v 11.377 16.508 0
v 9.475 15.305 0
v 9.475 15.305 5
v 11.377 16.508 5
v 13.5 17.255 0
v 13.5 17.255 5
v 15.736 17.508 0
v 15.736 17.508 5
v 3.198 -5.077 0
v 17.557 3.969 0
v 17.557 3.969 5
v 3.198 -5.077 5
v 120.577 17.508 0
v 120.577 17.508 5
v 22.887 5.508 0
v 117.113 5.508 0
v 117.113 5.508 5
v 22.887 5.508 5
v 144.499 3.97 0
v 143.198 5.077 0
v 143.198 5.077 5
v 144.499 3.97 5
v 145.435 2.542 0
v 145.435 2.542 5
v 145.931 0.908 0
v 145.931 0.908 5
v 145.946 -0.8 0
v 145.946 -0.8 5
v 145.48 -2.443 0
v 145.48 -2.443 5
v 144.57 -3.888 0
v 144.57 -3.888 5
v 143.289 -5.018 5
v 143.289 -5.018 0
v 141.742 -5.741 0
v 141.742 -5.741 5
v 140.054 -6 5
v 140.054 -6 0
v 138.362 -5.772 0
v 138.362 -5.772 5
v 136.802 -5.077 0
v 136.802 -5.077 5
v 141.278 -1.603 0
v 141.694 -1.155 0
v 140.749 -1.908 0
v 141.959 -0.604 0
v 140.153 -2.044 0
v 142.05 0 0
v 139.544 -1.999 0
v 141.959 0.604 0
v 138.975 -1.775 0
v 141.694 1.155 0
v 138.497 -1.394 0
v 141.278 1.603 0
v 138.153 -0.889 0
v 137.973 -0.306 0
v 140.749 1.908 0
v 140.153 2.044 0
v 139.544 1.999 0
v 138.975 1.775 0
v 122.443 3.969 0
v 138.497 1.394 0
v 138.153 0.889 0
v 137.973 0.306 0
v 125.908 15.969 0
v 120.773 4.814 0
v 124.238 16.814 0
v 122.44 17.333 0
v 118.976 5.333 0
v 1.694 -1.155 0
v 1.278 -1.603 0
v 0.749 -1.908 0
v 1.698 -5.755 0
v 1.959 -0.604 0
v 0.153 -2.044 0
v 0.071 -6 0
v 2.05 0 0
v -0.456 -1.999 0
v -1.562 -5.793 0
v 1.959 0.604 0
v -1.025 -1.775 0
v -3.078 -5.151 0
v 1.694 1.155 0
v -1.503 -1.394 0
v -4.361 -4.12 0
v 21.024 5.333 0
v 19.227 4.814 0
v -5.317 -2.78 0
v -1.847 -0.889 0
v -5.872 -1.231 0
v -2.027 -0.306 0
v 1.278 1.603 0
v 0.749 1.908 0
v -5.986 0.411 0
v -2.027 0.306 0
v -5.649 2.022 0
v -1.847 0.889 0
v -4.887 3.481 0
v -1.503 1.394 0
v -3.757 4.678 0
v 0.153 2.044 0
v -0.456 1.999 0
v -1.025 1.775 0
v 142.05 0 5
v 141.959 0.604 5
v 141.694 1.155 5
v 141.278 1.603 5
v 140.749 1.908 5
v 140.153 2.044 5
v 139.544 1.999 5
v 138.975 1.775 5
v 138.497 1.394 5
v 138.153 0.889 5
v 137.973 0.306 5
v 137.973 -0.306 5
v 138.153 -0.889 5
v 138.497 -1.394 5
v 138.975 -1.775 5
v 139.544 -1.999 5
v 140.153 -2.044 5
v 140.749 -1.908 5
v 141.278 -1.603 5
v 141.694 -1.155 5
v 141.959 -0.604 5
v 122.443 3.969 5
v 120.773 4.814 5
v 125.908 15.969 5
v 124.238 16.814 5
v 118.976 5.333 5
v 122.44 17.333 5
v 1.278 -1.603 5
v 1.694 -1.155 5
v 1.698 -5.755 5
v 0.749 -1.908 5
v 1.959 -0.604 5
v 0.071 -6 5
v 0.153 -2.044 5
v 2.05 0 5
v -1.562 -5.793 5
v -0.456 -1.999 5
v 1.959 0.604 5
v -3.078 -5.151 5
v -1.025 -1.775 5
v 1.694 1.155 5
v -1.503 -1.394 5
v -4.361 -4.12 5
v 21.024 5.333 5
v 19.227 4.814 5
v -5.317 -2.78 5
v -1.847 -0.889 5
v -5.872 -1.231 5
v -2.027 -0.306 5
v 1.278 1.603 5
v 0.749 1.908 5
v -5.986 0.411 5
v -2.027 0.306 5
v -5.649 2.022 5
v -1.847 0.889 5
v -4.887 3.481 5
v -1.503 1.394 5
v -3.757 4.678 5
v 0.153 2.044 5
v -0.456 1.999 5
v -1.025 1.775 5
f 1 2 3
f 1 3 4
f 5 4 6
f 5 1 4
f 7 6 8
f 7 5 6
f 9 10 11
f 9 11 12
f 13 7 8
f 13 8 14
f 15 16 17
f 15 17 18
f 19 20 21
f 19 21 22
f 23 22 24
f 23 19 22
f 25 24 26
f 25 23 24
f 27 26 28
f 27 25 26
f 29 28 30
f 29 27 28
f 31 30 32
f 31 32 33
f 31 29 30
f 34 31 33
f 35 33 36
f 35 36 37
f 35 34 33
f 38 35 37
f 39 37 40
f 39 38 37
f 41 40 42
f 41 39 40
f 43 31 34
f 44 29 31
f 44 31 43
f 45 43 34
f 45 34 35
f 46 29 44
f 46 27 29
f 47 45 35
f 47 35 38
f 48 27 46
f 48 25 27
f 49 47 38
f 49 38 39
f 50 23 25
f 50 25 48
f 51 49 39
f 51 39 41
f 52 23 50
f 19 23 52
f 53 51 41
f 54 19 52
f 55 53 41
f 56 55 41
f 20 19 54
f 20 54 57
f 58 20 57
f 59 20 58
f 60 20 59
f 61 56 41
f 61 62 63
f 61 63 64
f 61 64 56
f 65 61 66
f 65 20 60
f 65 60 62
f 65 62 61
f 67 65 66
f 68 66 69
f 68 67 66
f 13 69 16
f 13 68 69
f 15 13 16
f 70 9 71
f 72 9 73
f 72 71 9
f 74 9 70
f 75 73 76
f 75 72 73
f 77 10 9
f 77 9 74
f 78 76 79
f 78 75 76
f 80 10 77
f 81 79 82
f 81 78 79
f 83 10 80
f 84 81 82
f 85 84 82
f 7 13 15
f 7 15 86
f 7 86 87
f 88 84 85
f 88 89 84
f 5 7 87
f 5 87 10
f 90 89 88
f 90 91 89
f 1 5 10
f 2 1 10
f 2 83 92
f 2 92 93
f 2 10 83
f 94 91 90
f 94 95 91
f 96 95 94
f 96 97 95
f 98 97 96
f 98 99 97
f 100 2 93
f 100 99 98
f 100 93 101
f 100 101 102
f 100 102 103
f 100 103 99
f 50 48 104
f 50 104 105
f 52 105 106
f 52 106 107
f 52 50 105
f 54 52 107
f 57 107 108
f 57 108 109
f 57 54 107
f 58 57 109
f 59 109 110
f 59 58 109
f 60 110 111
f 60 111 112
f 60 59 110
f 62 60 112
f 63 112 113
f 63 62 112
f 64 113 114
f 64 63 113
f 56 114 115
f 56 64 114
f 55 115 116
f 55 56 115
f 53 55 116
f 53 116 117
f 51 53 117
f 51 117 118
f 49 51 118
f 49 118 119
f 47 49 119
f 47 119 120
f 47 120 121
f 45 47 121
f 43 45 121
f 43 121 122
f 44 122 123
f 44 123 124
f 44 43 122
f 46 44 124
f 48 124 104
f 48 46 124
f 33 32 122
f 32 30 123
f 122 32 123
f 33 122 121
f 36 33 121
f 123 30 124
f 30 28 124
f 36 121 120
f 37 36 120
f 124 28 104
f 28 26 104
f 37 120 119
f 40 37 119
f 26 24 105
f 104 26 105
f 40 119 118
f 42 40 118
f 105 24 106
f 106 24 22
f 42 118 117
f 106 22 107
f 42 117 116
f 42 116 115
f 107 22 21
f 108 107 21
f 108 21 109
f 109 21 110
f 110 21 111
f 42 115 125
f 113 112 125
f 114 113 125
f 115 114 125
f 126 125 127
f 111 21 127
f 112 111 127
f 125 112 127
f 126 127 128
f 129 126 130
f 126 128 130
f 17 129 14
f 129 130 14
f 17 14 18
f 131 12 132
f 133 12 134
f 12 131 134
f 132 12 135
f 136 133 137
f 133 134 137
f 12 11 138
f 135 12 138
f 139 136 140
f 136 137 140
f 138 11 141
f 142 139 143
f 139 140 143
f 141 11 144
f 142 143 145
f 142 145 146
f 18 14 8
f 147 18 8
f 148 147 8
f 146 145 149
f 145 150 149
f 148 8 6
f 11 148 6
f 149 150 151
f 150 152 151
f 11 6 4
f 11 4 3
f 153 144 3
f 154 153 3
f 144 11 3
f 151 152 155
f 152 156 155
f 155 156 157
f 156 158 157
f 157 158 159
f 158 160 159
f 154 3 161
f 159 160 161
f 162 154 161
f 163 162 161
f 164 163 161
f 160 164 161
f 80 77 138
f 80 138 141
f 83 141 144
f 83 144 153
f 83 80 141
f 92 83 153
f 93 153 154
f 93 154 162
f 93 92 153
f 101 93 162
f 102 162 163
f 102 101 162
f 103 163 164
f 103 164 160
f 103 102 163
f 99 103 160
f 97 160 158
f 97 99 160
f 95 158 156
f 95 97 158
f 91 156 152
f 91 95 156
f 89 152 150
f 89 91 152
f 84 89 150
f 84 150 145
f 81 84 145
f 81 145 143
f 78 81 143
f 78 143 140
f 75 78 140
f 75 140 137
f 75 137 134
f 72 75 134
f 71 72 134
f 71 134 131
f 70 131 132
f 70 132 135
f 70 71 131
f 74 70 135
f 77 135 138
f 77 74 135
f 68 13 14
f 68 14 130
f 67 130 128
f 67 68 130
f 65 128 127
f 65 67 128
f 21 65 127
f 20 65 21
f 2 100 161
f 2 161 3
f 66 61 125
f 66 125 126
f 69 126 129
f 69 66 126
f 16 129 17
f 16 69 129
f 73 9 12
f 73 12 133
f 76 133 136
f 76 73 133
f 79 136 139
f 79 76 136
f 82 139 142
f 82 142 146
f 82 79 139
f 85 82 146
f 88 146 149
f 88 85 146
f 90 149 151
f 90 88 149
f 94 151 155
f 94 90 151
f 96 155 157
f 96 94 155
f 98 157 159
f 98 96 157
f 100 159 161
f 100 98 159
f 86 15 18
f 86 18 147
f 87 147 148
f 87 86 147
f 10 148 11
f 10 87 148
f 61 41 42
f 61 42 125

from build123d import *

# Parameters (mm, degrees)
SCHIZZO1_R                   = 2.05
ESTRUSIONE_ESTRUSIONE1_DEPTH = 5


with BuildPart() as part:
    # Schizzo1 → Estrusione-Estrusione1 (new body)
    with BuildSketch(Plane.XY):
        with BuildLine():
            Line((-3.757019077, 4.678120099), (9.474796834, 15.30465036))
            ThreePointArc((9.474796834, 15.30465036), (12.41750963, 16.940934337), (15.736495295, 17.507783529))
            Line((15.736495295, 17.507783529), (120.577440721, 17.507783529))
            ThreePointArc((120.577440721, 17.507783529), (123.351342788, 17.115356965), (125.907534283, 15.968876995))
            Line((125.907534283, 15.968876995), (143.198056137, 5.076656079))
            ThreePointArc((143.198056137, 5.076656079), (145.076656079, -3.198056137), (136.801943863, -5.076656079))
            Line((136.801943863, -5.076656079), (122.442889956, 3.968876995))
            ThreePointArc((122.442889956, 3.968876995), (119.886698461, 5.115356965), (117.112796394, 5.507783529))
            Line((117.112796394, 5.507783529), (22.887203606, 5.507783529))
            ThreePointArc((22.887203606, 5.507783529), (20.113301539, 5.115356965), (17.557110044, 3.968876995))
            Line((17.557110044, 3.968876995), (3.198056137, -5.076656079))
            ThreePointArc((3.198056137, -5.076656079), (-4.885388875, -3.483242102), (-3.757019077, 4.678120099))
        make_face()
        Circle(SCHIZZO1_R, mode=Mode.SUBTRACT)
        with Locations((140, 0)):
            Circle(SCHIZZO1_R, mode=Mode.SUBTRACT)
    extrude(amount=ESTRUSIONE_ESTRUSIONE1_DEPTH)


solid = part.part
